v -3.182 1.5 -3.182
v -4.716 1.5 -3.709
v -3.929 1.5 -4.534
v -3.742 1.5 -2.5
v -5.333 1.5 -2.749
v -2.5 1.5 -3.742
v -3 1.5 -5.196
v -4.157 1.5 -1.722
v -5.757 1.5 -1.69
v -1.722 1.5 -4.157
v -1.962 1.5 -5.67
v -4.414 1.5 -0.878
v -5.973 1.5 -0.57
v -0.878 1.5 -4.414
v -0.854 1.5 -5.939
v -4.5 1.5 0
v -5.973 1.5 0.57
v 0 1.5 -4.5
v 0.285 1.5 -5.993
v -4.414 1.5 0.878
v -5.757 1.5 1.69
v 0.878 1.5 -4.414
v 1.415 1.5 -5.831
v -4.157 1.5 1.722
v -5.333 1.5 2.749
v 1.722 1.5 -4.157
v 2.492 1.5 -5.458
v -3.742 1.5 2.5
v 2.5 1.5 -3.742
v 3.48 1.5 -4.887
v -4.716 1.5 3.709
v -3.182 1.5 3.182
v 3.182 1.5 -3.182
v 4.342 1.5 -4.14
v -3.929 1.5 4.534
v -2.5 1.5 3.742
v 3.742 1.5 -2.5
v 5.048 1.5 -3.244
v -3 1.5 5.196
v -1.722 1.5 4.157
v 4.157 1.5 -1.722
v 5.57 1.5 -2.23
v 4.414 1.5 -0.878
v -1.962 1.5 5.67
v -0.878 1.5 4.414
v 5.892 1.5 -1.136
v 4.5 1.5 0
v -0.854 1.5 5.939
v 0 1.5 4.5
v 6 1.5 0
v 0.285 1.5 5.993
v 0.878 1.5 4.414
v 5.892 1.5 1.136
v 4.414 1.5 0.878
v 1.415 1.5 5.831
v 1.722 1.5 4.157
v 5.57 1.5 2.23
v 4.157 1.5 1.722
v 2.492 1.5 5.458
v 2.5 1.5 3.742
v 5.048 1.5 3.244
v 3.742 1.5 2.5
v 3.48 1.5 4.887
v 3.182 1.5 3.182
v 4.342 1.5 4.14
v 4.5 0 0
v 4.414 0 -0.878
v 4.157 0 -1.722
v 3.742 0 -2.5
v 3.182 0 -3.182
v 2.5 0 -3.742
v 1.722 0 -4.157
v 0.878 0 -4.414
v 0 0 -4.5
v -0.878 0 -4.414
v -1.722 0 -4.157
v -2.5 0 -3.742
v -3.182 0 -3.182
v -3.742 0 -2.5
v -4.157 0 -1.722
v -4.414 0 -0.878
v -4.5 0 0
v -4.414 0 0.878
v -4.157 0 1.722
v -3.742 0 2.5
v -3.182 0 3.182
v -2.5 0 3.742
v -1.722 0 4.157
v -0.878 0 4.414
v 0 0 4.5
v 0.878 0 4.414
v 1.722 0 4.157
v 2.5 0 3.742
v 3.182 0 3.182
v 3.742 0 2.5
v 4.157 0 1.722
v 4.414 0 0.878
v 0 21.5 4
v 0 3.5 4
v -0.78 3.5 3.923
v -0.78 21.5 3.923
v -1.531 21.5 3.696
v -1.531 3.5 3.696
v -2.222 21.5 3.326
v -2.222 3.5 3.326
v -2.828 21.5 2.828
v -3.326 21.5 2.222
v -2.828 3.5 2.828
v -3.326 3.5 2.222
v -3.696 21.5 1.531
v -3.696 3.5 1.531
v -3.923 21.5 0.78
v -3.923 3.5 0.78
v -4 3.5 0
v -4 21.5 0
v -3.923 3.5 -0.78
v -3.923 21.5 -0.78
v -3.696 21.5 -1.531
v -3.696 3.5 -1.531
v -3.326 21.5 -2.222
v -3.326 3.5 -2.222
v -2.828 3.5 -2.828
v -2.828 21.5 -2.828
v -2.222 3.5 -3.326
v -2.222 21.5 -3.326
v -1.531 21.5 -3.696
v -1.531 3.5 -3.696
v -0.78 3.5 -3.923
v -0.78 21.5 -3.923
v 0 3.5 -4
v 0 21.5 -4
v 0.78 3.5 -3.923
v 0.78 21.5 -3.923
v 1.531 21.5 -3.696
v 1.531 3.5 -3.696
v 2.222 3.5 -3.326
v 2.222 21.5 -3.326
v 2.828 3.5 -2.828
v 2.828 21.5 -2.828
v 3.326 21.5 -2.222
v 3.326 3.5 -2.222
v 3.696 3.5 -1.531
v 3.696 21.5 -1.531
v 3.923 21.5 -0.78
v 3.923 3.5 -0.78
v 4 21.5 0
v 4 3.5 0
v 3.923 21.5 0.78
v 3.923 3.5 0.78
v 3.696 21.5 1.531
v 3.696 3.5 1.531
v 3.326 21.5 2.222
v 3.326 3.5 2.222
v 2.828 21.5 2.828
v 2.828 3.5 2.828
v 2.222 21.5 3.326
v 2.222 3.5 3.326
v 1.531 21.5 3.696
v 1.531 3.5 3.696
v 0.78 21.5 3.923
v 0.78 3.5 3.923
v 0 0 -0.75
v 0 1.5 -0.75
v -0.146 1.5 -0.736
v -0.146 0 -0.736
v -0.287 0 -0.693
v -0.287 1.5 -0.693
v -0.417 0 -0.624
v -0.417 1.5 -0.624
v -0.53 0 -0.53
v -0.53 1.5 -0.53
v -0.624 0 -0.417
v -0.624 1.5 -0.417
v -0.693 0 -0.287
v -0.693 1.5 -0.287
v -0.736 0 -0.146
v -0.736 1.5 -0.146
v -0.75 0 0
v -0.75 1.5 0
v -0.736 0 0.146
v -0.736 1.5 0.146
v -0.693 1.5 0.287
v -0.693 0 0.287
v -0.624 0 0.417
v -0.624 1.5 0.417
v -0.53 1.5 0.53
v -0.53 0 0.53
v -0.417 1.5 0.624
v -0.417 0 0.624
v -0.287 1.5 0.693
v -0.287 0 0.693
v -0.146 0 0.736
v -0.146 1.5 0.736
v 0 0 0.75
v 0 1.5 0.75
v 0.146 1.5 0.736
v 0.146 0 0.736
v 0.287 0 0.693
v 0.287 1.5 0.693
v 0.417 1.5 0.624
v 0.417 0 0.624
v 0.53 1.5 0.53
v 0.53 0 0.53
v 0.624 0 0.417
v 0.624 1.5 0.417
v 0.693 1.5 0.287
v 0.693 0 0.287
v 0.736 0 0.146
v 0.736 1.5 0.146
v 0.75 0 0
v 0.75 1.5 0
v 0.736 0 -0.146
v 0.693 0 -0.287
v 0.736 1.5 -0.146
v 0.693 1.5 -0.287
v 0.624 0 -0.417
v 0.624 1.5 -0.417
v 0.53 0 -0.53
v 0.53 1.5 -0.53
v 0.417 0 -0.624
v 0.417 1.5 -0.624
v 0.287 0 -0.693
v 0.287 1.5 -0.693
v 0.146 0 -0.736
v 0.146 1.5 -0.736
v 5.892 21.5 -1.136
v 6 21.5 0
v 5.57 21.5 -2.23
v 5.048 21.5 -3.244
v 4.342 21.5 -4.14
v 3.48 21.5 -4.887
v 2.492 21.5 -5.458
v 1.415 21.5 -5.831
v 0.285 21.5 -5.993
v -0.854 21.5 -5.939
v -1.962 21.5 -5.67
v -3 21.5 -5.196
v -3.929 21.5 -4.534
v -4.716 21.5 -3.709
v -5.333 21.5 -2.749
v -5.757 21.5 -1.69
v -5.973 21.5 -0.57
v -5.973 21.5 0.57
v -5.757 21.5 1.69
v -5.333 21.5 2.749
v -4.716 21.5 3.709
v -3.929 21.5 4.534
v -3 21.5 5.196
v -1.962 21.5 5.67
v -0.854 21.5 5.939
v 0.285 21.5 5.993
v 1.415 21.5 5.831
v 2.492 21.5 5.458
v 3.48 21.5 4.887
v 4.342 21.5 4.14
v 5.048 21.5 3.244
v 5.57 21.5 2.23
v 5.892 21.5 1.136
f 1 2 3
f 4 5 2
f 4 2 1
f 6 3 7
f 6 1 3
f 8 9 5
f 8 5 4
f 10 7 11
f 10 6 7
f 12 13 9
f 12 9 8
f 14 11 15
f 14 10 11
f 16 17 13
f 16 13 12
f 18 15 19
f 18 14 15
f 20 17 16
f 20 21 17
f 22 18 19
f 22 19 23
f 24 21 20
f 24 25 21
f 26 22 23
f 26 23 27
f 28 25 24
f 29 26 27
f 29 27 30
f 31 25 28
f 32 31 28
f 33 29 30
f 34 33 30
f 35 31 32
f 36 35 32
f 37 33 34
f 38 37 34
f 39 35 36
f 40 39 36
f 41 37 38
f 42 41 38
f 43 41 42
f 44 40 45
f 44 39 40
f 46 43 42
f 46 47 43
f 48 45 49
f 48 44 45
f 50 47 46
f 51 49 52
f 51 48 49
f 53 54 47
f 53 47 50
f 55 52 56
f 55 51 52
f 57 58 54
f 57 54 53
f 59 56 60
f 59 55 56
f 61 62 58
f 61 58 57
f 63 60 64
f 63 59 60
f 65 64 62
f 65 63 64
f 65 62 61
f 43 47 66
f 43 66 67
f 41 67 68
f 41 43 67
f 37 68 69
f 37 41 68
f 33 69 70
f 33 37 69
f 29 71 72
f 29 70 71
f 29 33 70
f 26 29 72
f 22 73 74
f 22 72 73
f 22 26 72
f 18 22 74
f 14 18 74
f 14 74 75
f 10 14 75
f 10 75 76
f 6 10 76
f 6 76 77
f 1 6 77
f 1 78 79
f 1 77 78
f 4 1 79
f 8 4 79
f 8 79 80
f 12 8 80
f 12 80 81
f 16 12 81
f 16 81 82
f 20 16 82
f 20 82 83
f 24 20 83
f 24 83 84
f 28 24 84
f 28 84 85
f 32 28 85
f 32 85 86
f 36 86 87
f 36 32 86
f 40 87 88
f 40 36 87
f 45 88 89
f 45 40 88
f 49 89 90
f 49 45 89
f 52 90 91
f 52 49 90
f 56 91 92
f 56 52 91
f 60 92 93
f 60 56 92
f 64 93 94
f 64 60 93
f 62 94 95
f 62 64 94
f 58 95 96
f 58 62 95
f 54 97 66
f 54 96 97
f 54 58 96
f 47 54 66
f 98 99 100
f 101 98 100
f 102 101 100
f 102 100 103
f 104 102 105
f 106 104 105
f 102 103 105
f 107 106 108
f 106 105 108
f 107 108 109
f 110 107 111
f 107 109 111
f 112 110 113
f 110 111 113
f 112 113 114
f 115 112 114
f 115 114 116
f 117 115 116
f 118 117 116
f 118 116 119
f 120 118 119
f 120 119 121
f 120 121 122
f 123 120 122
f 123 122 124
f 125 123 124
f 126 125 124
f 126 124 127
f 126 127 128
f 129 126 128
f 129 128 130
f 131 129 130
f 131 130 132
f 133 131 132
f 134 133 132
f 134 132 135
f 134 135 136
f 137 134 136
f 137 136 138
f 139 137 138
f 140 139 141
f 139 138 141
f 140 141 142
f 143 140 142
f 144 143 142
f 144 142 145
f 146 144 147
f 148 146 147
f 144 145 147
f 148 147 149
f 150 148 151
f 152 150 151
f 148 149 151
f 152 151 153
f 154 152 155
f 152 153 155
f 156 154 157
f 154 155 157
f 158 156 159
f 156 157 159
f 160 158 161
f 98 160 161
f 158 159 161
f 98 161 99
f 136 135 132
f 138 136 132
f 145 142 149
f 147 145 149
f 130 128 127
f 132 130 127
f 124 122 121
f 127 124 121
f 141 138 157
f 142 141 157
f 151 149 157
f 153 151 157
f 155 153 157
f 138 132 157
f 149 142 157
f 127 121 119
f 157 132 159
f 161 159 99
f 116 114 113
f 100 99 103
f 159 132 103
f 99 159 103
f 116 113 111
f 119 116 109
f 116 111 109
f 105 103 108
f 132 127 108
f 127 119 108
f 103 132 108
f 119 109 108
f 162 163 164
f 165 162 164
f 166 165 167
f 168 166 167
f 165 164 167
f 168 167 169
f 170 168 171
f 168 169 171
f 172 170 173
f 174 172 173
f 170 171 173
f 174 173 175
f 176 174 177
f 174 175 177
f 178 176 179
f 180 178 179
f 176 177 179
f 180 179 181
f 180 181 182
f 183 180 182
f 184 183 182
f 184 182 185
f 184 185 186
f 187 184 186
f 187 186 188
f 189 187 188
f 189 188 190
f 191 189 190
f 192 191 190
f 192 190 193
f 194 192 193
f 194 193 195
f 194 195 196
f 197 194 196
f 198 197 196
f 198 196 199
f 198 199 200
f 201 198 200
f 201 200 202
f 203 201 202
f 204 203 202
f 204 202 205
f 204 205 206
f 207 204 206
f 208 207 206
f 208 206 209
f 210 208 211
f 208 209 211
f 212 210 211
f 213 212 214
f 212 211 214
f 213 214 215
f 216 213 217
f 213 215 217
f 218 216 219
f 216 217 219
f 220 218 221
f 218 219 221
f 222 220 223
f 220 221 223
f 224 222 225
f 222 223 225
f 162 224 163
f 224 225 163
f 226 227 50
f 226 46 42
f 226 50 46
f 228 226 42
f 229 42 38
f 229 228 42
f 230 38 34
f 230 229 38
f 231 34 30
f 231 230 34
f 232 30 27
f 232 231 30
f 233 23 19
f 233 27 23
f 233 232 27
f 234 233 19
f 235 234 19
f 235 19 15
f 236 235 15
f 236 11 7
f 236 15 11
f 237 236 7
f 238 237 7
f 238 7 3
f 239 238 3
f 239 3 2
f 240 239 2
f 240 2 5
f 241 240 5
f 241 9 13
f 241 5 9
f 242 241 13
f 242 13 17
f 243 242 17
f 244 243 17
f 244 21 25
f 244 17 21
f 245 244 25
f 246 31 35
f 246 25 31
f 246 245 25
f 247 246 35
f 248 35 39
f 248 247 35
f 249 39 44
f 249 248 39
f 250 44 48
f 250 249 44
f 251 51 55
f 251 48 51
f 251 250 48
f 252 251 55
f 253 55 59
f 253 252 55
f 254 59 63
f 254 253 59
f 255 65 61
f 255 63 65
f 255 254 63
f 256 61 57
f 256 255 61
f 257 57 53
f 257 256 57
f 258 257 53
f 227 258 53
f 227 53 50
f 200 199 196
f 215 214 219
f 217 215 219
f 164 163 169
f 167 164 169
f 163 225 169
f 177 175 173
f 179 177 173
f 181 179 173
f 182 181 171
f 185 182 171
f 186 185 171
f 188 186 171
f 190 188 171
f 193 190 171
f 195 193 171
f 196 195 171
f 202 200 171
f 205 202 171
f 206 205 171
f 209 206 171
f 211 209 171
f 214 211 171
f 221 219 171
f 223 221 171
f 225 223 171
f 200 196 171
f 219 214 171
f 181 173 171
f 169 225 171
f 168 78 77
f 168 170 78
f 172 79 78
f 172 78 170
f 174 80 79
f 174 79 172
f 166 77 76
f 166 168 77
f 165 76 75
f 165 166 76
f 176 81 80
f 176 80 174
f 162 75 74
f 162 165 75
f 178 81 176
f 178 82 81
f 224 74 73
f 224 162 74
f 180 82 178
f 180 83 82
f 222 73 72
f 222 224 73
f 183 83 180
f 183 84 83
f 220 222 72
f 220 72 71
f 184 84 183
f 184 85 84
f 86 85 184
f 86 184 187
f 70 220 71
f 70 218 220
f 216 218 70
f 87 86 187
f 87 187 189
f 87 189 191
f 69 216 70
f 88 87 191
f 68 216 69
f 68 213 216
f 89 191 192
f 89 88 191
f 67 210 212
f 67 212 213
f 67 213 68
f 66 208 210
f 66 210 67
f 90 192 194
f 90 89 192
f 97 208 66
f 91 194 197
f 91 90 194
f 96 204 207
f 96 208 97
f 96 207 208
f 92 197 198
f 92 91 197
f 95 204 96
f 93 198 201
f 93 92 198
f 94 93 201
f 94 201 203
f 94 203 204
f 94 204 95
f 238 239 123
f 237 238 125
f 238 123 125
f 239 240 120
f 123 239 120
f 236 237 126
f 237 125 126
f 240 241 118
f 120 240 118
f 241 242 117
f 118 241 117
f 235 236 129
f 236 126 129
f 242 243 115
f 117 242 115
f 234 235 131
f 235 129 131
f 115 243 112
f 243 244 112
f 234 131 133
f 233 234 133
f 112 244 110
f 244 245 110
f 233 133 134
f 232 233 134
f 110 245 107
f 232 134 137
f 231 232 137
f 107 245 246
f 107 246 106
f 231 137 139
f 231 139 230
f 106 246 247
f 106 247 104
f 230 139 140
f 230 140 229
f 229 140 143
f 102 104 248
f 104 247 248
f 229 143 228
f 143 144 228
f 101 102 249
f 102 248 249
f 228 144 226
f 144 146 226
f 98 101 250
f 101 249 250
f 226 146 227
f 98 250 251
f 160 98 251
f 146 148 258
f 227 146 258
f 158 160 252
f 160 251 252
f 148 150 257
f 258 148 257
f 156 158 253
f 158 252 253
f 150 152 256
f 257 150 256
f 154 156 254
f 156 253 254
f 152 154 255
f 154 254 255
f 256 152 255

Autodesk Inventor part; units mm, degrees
ref_plane "YZ Plane" through (0, 0, 0) normal (1, 0, 0) x (0, 1, 0)
ref_plane "XZ Plane" through (0, 0, 0) normal (0, 1, 0) x (-1, 0, 0)
ref_plane "XY Plane" through (0, 0, 0) normal (0, 0, 1) x (1, 0, 0)
sketch "Skizze2" plane through (0, 0, 0) normal (0, 0, 1) x (1, 0, 0)
  line L0 (0, 0) -> (4.5, 0)
  line L1 (4.5, 0) -> (4.5, 1.5)
  line L2 (4.5, 1.5) -> (6, 1.5)
  line L3 (6, 1.5) -> (6, 21.5)
  line L4 (6, 21.5) -> (0, 21.5)
  line L5 (0, 21.5) -> (0, 0)
  point P0 (2.25, 0)
  point P1 (5.25, 1.5)
  dimension "d1" = 21.5
  dimension "d2" = 1.5
  dimension "d3" = 12
  dimension "d4" = 9
revolve "Umdrehung1" add sketch "Skizze2" angle 360 about axis through (0, 21.5, 0) along (0, -1, 0)
sketch "Skizze3" plane through (0, 21.5, 0) normal (0, 1, 0) x (1, 0, 0)
  circle A0 centre (0, 0) radius 6 projected
hole "Bohrung1" at (0, 21.5, 0) direction (0, -1, 0) diameter 8 depth 18
sketch "Sketch4" plane through (0, 0, 0) normal (0, -1, 0) x (1, 0, 0)
  circle A0 centre (0, 0) radius 4.5 projected
hole "Hole2" at (0, 0, 0) direction (0, 1, 0) diameter 1.5 depth 1.5
properties part number "153 part 1" material "Gold"
